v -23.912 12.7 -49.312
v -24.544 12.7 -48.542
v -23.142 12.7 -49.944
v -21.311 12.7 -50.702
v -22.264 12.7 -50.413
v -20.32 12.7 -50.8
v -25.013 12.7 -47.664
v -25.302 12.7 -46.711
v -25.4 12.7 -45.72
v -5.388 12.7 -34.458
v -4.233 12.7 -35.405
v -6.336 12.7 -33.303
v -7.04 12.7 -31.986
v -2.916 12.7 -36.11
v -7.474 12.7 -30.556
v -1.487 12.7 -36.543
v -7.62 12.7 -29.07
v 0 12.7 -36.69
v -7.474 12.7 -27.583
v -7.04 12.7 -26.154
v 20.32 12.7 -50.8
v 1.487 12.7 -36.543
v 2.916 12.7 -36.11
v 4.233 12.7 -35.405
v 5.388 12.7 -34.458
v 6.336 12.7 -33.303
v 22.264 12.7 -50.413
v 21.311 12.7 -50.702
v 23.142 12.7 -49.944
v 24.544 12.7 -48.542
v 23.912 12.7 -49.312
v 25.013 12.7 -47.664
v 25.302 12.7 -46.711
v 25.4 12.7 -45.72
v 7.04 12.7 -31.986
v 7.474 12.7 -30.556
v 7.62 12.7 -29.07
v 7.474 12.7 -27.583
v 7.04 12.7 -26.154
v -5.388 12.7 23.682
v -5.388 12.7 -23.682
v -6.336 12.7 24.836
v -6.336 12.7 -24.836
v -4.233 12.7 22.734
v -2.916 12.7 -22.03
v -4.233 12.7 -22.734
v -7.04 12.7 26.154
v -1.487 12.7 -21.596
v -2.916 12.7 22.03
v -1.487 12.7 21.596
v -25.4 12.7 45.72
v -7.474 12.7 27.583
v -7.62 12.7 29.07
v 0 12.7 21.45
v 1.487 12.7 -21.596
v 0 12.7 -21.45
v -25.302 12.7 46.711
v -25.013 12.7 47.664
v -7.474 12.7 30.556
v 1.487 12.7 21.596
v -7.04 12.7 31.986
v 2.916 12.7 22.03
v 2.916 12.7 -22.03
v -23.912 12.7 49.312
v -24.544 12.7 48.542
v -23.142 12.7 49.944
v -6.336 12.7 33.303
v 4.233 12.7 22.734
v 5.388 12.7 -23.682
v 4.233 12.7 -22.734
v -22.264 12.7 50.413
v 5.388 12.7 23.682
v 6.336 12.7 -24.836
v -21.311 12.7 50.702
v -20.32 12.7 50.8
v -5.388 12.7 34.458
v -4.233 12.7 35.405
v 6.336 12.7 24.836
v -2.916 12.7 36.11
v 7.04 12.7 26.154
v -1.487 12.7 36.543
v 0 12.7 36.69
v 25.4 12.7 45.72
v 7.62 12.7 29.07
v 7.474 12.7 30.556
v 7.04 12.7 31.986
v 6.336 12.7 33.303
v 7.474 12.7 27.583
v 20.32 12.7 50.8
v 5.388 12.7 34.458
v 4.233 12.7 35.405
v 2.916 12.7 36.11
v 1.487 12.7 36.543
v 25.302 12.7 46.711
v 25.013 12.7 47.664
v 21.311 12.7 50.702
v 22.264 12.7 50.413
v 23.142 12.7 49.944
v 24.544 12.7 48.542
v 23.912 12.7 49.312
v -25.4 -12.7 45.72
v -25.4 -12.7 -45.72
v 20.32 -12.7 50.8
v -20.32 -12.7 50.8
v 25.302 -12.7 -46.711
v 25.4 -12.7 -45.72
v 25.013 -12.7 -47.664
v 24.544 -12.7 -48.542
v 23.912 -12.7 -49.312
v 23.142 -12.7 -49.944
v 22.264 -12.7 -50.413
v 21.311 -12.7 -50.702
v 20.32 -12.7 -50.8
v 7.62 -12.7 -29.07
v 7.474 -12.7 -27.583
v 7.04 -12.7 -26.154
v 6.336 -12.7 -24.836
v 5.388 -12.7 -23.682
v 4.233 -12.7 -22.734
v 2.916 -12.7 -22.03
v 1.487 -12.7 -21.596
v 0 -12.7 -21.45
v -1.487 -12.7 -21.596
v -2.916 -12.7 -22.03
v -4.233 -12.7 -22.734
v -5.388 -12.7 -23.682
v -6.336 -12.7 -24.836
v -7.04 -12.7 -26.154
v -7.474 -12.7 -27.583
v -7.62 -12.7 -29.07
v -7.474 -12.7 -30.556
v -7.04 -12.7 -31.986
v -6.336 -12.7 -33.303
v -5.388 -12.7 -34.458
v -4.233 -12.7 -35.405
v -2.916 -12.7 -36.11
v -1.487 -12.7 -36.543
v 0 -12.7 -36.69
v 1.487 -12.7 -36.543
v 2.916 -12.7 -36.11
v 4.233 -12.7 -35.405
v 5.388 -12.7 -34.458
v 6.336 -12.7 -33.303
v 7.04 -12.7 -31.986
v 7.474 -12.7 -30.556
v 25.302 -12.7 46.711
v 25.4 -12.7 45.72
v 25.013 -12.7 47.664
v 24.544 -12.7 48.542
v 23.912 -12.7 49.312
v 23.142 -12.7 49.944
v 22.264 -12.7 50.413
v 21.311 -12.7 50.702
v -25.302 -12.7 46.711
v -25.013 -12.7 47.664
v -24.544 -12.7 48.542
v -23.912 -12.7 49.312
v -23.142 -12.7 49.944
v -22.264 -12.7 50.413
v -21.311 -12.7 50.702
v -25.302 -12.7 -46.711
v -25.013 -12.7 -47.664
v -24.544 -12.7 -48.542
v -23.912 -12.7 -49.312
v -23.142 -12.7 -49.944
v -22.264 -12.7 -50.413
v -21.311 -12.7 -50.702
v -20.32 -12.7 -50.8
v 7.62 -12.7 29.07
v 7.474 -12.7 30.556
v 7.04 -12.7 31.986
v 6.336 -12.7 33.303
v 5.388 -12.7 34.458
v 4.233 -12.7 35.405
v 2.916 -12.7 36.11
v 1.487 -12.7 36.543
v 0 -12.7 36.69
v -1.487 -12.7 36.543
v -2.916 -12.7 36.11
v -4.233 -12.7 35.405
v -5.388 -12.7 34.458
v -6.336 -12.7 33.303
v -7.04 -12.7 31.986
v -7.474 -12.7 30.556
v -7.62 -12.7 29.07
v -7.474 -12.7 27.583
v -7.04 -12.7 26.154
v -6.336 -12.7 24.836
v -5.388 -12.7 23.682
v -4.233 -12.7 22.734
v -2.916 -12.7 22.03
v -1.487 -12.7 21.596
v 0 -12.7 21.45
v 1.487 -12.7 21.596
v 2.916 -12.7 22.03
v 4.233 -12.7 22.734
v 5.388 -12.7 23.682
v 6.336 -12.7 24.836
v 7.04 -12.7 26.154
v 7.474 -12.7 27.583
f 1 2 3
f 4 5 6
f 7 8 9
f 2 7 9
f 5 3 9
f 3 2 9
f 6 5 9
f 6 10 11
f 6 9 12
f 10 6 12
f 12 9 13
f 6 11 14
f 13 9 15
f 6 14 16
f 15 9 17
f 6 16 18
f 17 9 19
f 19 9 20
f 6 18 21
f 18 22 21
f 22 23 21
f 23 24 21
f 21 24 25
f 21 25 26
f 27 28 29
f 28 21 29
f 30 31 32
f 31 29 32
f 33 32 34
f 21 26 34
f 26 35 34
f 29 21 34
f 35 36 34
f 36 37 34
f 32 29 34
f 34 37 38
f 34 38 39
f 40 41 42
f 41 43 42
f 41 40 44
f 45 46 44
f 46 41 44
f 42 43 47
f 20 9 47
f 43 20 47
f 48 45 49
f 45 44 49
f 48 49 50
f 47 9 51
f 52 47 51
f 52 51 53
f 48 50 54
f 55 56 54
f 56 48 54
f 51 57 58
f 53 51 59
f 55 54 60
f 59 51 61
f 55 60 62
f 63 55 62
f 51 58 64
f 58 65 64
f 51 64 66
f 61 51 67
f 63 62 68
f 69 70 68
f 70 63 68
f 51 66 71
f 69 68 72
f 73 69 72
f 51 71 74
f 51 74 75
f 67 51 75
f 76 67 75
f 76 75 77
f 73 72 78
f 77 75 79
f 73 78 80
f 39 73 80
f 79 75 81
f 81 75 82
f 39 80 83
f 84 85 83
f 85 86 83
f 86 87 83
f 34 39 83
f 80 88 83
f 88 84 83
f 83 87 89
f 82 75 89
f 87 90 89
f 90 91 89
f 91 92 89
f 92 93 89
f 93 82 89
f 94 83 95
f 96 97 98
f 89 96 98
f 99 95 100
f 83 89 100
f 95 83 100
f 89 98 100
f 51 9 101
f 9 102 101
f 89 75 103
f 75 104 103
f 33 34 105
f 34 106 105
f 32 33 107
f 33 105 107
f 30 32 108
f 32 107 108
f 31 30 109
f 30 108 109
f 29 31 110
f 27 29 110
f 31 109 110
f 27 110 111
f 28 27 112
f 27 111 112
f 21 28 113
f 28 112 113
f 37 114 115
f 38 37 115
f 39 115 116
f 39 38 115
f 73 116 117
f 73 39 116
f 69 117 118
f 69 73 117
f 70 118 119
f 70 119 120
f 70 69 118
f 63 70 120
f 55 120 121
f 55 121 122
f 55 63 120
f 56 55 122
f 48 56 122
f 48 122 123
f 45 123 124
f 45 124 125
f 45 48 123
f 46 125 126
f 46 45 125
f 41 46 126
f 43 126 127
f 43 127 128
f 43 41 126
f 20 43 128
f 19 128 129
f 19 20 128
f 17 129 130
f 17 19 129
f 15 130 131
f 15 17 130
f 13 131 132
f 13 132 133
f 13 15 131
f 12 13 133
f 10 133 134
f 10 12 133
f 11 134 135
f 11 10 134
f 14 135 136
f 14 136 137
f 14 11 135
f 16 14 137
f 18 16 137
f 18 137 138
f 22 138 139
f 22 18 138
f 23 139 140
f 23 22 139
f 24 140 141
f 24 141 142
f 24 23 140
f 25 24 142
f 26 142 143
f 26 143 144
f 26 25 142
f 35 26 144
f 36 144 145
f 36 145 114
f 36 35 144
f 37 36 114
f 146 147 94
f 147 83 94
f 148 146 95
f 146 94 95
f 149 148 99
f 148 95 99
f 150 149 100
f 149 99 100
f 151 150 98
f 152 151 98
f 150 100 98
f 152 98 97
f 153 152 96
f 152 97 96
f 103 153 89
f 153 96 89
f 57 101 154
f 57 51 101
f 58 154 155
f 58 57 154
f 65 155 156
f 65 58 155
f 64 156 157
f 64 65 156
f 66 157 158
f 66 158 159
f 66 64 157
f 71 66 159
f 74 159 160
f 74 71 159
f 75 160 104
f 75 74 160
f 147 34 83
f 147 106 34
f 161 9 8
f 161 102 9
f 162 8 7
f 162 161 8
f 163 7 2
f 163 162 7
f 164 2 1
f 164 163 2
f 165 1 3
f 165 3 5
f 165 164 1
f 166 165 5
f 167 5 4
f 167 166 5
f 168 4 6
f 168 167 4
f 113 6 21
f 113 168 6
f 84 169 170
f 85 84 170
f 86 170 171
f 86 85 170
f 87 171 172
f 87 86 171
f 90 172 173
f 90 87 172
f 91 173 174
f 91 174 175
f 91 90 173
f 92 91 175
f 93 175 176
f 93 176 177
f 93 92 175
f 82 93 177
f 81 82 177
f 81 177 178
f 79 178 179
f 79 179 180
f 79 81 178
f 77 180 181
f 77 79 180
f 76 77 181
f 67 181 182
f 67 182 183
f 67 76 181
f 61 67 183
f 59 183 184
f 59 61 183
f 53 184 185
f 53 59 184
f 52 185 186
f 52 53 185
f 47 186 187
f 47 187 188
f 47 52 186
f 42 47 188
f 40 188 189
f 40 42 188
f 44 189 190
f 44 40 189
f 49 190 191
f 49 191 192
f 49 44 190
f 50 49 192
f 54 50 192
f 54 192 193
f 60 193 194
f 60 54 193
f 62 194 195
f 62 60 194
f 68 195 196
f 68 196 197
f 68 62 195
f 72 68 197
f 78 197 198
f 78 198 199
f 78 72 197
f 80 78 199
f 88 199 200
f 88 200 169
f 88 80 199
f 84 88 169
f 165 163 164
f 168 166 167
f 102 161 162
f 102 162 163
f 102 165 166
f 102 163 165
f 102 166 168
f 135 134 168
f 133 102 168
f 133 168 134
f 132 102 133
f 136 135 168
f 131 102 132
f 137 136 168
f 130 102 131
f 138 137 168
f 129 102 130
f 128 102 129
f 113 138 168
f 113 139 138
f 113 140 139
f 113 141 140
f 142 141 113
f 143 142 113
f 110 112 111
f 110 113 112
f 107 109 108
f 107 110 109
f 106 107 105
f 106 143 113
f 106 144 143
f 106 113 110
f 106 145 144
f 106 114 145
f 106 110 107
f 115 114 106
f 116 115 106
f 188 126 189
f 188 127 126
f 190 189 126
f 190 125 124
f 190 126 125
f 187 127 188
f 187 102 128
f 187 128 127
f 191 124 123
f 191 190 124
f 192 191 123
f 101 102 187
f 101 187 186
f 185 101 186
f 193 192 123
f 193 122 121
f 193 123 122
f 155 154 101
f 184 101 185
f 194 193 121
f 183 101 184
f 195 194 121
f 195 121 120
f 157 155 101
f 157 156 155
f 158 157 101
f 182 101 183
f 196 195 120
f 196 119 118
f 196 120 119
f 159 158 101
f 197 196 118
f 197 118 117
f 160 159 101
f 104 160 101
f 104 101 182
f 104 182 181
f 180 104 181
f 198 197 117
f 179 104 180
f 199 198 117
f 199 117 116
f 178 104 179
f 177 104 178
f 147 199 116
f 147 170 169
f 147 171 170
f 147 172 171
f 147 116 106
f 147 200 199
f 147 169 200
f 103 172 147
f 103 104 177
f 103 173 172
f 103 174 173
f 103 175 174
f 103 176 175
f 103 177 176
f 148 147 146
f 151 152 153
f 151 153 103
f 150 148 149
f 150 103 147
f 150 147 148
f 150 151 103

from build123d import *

# Parameters (mm, degrees)
F0_W     = 50.8
F0_H     = 101.6
F0_R     = 7.62
F1_DEPTH = 12.7
F2_R     = 5.08


with BuildPart() as f1:
    # F0 (on Front) → F1 (new body, symmetric)
    with BuildSketch(Plane.XZ):
        Rectangle(F0_W, F0_H)
        with Locations((0, -29.069694)):
            Circle(F0_R, mode=Mode.SUBTRACT)
        with Locations((0, 29.069694)):
            Circle(F0_R, mode=Mode.SUBTRACT)
    extrude(amount=F1_DEPTH, both=True)

    # F2
    f2_edges = [f1.edges().sort_by_distance(p)[0] for p in [
        (25.4, 0, 50.8),
        (-25.4, 0, 50.8),
        (25.4, 0, -50.8),
        (-25.4, 0, -50.8),
    ]]
    fillet(f2_edges, radius=F2_R)


solid = f1.part
